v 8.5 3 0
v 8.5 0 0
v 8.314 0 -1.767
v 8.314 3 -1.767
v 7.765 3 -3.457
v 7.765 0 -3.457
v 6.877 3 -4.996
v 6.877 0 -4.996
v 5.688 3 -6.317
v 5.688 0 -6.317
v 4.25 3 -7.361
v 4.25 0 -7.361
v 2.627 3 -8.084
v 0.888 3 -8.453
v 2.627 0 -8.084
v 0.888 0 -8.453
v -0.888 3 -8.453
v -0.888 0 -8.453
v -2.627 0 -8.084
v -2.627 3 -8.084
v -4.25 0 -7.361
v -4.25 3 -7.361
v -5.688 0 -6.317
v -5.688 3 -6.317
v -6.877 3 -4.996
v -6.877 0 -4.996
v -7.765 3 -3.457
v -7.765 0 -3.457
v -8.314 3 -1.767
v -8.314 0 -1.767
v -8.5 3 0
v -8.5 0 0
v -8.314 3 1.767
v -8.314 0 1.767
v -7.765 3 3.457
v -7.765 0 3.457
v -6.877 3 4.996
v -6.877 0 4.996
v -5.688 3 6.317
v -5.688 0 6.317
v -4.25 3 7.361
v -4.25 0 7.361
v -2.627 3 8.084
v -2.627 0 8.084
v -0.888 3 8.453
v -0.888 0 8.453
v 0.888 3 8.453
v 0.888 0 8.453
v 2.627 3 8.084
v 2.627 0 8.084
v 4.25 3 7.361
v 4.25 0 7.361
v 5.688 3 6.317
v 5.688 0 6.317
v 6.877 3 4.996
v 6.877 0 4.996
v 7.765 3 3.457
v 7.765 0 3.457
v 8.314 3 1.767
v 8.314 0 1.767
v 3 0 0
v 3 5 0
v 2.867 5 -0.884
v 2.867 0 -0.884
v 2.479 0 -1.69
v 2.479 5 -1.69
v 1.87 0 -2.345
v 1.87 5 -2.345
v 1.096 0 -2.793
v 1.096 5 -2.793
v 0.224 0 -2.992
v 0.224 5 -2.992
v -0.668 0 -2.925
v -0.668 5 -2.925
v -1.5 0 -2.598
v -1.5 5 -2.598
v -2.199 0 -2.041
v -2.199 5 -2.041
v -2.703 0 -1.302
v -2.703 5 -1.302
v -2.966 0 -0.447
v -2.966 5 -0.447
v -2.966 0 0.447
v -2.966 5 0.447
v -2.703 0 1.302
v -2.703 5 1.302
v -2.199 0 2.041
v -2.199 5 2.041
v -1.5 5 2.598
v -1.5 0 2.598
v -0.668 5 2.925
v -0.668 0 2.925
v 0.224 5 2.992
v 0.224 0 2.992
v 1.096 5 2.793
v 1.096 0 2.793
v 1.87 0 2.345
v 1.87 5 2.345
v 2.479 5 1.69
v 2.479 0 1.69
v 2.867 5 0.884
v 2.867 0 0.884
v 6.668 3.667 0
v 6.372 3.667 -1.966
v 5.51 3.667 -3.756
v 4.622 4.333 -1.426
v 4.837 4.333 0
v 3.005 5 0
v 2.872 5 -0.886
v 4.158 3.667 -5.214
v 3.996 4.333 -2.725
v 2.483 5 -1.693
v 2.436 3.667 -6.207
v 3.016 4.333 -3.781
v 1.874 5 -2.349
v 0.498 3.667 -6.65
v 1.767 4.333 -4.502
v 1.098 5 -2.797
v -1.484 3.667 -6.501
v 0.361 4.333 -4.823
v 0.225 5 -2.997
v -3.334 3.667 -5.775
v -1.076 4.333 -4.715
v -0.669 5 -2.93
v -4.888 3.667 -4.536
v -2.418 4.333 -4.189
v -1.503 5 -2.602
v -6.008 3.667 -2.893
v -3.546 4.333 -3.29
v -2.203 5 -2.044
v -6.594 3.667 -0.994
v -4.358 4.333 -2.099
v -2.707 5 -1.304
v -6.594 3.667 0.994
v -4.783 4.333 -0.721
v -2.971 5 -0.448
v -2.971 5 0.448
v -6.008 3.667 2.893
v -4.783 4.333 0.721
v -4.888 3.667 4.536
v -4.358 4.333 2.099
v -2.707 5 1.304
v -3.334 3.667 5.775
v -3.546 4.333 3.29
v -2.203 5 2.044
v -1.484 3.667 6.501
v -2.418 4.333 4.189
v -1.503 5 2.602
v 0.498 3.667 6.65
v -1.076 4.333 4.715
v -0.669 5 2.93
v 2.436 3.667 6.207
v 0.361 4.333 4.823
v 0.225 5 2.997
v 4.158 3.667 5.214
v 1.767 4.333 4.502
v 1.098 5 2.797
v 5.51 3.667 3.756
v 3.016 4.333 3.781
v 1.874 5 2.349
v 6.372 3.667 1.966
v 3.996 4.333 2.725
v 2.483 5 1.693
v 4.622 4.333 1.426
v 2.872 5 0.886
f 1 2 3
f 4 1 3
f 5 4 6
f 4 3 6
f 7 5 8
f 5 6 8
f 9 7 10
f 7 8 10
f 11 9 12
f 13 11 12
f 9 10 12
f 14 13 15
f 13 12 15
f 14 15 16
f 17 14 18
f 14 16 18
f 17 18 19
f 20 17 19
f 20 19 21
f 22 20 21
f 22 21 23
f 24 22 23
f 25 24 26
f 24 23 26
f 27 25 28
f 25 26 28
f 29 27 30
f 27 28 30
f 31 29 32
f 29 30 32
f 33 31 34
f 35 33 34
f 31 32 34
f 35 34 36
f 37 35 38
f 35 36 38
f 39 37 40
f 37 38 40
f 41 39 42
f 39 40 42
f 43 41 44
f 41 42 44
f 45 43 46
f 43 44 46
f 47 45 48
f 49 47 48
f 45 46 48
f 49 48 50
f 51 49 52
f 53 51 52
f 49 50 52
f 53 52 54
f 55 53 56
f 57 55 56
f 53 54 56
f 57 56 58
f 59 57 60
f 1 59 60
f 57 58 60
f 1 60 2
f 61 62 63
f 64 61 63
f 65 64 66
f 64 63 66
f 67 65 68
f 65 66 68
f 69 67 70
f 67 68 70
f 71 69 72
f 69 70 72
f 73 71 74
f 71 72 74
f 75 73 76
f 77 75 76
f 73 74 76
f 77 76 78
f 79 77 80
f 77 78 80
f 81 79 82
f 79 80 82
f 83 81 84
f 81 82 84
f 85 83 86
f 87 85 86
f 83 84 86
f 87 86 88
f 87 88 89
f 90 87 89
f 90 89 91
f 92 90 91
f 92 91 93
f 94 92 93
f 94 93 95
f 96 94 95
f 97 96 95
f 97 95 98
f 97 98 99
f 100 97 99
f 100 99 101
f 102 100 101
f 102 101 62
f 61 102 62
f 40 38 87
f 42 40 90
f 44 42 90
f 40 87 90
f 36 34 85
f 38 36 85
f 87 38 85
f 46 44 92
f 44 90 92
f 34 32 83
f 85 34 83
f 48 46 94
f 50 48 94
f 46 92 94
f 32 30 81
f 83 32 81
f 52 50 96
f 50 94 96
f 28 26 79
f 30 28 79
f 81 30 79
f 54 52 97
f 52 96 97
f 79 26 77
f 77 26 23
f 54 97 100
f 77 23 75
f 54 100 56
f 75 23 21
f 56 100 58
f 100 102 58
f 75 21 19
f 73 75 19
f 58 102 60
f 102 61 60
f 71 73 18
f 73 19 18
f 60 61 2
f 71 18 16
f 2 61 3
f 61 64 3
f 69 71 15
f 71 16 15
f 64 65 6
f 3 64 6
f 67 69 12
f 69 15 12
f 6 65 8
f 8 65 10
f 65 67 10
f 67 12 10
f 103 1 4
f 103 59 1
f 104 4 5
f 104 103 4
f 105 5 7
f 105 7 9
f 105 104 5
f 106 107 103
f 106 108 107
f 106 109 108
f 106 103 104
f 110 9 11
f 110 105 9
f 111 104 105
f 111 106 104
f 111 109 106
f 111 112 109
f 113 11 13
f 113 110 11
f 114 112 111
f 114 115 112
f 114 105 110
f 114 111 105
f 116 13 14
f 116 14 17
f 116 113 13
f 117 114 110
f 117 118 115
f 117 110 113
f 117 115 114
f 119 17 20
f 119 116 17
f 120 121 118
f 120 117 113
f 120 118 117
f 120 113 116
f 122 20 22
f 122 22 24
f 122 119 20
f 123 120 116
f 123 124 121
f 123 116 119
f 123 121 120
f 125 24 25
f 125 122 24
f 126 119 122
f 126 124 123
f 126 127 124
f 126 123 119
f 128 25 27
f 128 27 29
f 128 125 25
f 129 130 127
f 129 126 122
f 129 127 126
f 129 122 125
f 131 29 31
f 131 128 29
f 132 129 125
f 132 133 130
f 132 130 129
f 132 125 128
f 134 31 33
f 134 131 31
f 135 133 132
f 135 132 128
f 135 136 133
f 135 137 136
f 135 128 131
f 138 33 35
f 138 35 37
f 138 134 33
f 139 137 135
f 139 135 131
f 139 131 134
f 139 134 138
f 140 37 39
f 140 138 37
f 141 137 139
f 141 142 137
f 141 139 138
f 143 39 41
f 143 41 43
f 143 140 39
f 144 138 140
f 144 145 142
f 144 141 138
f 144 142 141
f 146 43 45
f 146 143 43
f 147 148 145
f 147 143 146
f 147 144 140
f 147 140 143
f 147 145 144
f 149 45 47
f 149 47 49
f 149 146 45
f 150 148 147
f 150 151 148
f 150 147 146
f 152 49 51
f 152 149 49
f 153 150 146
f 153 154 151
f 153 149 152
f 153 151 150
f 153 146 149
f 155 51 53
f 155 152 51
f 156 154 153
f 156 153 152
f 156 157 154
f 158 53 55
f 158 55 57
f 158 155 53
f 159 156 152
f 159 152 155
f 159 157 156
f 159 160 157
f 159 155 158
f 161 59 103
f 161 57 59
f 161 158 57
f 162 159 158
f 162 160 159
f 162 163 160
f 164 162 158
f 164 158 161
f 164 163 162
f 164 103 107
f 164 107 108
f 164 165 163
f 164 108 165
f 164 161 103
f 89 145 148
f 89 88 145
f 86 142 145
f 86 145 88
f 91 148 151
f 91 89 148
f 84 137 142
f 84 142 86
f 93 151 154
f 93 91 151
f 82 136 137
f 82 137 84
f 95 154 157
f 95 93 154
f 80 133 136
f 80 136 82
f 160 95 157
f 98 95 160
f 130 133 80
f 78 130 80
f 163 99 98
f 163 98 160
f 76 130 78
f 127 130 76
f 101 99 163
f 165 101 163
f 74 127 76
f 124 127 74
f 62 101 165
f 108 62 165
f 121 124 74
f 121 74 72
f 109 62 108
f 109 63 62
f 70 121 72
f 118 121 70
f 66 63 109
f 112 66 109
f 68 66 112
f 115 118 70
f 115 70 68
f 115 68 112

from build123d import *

# Parameters (mm, degrees)
CROQUIS1_R              = 8.5
SALIENTE_EXTRUIR1_DEPTH = 5
CROQUIS2_R              = 3
CORTAR_EXTRUIR1_DEPTH   = 15
CHAFL_N1_SIZE           = 2
CHAFL_N1_SIZE2          = 5.494954839


with BuildPart() as part:
    # Croquis1 → Saliente-Extruir1 (new body)
    with BuildSketch(Plane(origin=(0, 0, 0), x_dir=(1, 0, 0), z_dir=(0, 1, 0))):
        Circle(CROQUIS1_R)
    extrude(amount=SALIENTE_EXTRUIR1_DEPTH)

    # Croquis2 → Cortar-Extruir1 (cut)
    with BuildSketch(Plane(origin=(0, 5, 0), x_dir=(1, 0, 0), z_dir=(0, 1, 0))):
        Circle(CROQUIS2_R)
    extrude(amount=-CORTAR_EXTRUIR1_DEPTH, mode=Mode.SUBTRACT)

    # Chaflán1
    chafl_n1_edges = [part.edges().sort_by_distance(p)[0] for p in [
        (-8.5, 5, 0),
    ]]
    chafl_n1_side = [part.faces().sort_by_distance(p)[0] for p in [
        (-8.5, 2.5, 0),
    ]]
    chamfer(chafl_n1_edges, length=CHAFL_N1_SIZE, length2=CHAFL_N1_SIZE2, reference=chafl_n1_side[0])


solid = part.part
